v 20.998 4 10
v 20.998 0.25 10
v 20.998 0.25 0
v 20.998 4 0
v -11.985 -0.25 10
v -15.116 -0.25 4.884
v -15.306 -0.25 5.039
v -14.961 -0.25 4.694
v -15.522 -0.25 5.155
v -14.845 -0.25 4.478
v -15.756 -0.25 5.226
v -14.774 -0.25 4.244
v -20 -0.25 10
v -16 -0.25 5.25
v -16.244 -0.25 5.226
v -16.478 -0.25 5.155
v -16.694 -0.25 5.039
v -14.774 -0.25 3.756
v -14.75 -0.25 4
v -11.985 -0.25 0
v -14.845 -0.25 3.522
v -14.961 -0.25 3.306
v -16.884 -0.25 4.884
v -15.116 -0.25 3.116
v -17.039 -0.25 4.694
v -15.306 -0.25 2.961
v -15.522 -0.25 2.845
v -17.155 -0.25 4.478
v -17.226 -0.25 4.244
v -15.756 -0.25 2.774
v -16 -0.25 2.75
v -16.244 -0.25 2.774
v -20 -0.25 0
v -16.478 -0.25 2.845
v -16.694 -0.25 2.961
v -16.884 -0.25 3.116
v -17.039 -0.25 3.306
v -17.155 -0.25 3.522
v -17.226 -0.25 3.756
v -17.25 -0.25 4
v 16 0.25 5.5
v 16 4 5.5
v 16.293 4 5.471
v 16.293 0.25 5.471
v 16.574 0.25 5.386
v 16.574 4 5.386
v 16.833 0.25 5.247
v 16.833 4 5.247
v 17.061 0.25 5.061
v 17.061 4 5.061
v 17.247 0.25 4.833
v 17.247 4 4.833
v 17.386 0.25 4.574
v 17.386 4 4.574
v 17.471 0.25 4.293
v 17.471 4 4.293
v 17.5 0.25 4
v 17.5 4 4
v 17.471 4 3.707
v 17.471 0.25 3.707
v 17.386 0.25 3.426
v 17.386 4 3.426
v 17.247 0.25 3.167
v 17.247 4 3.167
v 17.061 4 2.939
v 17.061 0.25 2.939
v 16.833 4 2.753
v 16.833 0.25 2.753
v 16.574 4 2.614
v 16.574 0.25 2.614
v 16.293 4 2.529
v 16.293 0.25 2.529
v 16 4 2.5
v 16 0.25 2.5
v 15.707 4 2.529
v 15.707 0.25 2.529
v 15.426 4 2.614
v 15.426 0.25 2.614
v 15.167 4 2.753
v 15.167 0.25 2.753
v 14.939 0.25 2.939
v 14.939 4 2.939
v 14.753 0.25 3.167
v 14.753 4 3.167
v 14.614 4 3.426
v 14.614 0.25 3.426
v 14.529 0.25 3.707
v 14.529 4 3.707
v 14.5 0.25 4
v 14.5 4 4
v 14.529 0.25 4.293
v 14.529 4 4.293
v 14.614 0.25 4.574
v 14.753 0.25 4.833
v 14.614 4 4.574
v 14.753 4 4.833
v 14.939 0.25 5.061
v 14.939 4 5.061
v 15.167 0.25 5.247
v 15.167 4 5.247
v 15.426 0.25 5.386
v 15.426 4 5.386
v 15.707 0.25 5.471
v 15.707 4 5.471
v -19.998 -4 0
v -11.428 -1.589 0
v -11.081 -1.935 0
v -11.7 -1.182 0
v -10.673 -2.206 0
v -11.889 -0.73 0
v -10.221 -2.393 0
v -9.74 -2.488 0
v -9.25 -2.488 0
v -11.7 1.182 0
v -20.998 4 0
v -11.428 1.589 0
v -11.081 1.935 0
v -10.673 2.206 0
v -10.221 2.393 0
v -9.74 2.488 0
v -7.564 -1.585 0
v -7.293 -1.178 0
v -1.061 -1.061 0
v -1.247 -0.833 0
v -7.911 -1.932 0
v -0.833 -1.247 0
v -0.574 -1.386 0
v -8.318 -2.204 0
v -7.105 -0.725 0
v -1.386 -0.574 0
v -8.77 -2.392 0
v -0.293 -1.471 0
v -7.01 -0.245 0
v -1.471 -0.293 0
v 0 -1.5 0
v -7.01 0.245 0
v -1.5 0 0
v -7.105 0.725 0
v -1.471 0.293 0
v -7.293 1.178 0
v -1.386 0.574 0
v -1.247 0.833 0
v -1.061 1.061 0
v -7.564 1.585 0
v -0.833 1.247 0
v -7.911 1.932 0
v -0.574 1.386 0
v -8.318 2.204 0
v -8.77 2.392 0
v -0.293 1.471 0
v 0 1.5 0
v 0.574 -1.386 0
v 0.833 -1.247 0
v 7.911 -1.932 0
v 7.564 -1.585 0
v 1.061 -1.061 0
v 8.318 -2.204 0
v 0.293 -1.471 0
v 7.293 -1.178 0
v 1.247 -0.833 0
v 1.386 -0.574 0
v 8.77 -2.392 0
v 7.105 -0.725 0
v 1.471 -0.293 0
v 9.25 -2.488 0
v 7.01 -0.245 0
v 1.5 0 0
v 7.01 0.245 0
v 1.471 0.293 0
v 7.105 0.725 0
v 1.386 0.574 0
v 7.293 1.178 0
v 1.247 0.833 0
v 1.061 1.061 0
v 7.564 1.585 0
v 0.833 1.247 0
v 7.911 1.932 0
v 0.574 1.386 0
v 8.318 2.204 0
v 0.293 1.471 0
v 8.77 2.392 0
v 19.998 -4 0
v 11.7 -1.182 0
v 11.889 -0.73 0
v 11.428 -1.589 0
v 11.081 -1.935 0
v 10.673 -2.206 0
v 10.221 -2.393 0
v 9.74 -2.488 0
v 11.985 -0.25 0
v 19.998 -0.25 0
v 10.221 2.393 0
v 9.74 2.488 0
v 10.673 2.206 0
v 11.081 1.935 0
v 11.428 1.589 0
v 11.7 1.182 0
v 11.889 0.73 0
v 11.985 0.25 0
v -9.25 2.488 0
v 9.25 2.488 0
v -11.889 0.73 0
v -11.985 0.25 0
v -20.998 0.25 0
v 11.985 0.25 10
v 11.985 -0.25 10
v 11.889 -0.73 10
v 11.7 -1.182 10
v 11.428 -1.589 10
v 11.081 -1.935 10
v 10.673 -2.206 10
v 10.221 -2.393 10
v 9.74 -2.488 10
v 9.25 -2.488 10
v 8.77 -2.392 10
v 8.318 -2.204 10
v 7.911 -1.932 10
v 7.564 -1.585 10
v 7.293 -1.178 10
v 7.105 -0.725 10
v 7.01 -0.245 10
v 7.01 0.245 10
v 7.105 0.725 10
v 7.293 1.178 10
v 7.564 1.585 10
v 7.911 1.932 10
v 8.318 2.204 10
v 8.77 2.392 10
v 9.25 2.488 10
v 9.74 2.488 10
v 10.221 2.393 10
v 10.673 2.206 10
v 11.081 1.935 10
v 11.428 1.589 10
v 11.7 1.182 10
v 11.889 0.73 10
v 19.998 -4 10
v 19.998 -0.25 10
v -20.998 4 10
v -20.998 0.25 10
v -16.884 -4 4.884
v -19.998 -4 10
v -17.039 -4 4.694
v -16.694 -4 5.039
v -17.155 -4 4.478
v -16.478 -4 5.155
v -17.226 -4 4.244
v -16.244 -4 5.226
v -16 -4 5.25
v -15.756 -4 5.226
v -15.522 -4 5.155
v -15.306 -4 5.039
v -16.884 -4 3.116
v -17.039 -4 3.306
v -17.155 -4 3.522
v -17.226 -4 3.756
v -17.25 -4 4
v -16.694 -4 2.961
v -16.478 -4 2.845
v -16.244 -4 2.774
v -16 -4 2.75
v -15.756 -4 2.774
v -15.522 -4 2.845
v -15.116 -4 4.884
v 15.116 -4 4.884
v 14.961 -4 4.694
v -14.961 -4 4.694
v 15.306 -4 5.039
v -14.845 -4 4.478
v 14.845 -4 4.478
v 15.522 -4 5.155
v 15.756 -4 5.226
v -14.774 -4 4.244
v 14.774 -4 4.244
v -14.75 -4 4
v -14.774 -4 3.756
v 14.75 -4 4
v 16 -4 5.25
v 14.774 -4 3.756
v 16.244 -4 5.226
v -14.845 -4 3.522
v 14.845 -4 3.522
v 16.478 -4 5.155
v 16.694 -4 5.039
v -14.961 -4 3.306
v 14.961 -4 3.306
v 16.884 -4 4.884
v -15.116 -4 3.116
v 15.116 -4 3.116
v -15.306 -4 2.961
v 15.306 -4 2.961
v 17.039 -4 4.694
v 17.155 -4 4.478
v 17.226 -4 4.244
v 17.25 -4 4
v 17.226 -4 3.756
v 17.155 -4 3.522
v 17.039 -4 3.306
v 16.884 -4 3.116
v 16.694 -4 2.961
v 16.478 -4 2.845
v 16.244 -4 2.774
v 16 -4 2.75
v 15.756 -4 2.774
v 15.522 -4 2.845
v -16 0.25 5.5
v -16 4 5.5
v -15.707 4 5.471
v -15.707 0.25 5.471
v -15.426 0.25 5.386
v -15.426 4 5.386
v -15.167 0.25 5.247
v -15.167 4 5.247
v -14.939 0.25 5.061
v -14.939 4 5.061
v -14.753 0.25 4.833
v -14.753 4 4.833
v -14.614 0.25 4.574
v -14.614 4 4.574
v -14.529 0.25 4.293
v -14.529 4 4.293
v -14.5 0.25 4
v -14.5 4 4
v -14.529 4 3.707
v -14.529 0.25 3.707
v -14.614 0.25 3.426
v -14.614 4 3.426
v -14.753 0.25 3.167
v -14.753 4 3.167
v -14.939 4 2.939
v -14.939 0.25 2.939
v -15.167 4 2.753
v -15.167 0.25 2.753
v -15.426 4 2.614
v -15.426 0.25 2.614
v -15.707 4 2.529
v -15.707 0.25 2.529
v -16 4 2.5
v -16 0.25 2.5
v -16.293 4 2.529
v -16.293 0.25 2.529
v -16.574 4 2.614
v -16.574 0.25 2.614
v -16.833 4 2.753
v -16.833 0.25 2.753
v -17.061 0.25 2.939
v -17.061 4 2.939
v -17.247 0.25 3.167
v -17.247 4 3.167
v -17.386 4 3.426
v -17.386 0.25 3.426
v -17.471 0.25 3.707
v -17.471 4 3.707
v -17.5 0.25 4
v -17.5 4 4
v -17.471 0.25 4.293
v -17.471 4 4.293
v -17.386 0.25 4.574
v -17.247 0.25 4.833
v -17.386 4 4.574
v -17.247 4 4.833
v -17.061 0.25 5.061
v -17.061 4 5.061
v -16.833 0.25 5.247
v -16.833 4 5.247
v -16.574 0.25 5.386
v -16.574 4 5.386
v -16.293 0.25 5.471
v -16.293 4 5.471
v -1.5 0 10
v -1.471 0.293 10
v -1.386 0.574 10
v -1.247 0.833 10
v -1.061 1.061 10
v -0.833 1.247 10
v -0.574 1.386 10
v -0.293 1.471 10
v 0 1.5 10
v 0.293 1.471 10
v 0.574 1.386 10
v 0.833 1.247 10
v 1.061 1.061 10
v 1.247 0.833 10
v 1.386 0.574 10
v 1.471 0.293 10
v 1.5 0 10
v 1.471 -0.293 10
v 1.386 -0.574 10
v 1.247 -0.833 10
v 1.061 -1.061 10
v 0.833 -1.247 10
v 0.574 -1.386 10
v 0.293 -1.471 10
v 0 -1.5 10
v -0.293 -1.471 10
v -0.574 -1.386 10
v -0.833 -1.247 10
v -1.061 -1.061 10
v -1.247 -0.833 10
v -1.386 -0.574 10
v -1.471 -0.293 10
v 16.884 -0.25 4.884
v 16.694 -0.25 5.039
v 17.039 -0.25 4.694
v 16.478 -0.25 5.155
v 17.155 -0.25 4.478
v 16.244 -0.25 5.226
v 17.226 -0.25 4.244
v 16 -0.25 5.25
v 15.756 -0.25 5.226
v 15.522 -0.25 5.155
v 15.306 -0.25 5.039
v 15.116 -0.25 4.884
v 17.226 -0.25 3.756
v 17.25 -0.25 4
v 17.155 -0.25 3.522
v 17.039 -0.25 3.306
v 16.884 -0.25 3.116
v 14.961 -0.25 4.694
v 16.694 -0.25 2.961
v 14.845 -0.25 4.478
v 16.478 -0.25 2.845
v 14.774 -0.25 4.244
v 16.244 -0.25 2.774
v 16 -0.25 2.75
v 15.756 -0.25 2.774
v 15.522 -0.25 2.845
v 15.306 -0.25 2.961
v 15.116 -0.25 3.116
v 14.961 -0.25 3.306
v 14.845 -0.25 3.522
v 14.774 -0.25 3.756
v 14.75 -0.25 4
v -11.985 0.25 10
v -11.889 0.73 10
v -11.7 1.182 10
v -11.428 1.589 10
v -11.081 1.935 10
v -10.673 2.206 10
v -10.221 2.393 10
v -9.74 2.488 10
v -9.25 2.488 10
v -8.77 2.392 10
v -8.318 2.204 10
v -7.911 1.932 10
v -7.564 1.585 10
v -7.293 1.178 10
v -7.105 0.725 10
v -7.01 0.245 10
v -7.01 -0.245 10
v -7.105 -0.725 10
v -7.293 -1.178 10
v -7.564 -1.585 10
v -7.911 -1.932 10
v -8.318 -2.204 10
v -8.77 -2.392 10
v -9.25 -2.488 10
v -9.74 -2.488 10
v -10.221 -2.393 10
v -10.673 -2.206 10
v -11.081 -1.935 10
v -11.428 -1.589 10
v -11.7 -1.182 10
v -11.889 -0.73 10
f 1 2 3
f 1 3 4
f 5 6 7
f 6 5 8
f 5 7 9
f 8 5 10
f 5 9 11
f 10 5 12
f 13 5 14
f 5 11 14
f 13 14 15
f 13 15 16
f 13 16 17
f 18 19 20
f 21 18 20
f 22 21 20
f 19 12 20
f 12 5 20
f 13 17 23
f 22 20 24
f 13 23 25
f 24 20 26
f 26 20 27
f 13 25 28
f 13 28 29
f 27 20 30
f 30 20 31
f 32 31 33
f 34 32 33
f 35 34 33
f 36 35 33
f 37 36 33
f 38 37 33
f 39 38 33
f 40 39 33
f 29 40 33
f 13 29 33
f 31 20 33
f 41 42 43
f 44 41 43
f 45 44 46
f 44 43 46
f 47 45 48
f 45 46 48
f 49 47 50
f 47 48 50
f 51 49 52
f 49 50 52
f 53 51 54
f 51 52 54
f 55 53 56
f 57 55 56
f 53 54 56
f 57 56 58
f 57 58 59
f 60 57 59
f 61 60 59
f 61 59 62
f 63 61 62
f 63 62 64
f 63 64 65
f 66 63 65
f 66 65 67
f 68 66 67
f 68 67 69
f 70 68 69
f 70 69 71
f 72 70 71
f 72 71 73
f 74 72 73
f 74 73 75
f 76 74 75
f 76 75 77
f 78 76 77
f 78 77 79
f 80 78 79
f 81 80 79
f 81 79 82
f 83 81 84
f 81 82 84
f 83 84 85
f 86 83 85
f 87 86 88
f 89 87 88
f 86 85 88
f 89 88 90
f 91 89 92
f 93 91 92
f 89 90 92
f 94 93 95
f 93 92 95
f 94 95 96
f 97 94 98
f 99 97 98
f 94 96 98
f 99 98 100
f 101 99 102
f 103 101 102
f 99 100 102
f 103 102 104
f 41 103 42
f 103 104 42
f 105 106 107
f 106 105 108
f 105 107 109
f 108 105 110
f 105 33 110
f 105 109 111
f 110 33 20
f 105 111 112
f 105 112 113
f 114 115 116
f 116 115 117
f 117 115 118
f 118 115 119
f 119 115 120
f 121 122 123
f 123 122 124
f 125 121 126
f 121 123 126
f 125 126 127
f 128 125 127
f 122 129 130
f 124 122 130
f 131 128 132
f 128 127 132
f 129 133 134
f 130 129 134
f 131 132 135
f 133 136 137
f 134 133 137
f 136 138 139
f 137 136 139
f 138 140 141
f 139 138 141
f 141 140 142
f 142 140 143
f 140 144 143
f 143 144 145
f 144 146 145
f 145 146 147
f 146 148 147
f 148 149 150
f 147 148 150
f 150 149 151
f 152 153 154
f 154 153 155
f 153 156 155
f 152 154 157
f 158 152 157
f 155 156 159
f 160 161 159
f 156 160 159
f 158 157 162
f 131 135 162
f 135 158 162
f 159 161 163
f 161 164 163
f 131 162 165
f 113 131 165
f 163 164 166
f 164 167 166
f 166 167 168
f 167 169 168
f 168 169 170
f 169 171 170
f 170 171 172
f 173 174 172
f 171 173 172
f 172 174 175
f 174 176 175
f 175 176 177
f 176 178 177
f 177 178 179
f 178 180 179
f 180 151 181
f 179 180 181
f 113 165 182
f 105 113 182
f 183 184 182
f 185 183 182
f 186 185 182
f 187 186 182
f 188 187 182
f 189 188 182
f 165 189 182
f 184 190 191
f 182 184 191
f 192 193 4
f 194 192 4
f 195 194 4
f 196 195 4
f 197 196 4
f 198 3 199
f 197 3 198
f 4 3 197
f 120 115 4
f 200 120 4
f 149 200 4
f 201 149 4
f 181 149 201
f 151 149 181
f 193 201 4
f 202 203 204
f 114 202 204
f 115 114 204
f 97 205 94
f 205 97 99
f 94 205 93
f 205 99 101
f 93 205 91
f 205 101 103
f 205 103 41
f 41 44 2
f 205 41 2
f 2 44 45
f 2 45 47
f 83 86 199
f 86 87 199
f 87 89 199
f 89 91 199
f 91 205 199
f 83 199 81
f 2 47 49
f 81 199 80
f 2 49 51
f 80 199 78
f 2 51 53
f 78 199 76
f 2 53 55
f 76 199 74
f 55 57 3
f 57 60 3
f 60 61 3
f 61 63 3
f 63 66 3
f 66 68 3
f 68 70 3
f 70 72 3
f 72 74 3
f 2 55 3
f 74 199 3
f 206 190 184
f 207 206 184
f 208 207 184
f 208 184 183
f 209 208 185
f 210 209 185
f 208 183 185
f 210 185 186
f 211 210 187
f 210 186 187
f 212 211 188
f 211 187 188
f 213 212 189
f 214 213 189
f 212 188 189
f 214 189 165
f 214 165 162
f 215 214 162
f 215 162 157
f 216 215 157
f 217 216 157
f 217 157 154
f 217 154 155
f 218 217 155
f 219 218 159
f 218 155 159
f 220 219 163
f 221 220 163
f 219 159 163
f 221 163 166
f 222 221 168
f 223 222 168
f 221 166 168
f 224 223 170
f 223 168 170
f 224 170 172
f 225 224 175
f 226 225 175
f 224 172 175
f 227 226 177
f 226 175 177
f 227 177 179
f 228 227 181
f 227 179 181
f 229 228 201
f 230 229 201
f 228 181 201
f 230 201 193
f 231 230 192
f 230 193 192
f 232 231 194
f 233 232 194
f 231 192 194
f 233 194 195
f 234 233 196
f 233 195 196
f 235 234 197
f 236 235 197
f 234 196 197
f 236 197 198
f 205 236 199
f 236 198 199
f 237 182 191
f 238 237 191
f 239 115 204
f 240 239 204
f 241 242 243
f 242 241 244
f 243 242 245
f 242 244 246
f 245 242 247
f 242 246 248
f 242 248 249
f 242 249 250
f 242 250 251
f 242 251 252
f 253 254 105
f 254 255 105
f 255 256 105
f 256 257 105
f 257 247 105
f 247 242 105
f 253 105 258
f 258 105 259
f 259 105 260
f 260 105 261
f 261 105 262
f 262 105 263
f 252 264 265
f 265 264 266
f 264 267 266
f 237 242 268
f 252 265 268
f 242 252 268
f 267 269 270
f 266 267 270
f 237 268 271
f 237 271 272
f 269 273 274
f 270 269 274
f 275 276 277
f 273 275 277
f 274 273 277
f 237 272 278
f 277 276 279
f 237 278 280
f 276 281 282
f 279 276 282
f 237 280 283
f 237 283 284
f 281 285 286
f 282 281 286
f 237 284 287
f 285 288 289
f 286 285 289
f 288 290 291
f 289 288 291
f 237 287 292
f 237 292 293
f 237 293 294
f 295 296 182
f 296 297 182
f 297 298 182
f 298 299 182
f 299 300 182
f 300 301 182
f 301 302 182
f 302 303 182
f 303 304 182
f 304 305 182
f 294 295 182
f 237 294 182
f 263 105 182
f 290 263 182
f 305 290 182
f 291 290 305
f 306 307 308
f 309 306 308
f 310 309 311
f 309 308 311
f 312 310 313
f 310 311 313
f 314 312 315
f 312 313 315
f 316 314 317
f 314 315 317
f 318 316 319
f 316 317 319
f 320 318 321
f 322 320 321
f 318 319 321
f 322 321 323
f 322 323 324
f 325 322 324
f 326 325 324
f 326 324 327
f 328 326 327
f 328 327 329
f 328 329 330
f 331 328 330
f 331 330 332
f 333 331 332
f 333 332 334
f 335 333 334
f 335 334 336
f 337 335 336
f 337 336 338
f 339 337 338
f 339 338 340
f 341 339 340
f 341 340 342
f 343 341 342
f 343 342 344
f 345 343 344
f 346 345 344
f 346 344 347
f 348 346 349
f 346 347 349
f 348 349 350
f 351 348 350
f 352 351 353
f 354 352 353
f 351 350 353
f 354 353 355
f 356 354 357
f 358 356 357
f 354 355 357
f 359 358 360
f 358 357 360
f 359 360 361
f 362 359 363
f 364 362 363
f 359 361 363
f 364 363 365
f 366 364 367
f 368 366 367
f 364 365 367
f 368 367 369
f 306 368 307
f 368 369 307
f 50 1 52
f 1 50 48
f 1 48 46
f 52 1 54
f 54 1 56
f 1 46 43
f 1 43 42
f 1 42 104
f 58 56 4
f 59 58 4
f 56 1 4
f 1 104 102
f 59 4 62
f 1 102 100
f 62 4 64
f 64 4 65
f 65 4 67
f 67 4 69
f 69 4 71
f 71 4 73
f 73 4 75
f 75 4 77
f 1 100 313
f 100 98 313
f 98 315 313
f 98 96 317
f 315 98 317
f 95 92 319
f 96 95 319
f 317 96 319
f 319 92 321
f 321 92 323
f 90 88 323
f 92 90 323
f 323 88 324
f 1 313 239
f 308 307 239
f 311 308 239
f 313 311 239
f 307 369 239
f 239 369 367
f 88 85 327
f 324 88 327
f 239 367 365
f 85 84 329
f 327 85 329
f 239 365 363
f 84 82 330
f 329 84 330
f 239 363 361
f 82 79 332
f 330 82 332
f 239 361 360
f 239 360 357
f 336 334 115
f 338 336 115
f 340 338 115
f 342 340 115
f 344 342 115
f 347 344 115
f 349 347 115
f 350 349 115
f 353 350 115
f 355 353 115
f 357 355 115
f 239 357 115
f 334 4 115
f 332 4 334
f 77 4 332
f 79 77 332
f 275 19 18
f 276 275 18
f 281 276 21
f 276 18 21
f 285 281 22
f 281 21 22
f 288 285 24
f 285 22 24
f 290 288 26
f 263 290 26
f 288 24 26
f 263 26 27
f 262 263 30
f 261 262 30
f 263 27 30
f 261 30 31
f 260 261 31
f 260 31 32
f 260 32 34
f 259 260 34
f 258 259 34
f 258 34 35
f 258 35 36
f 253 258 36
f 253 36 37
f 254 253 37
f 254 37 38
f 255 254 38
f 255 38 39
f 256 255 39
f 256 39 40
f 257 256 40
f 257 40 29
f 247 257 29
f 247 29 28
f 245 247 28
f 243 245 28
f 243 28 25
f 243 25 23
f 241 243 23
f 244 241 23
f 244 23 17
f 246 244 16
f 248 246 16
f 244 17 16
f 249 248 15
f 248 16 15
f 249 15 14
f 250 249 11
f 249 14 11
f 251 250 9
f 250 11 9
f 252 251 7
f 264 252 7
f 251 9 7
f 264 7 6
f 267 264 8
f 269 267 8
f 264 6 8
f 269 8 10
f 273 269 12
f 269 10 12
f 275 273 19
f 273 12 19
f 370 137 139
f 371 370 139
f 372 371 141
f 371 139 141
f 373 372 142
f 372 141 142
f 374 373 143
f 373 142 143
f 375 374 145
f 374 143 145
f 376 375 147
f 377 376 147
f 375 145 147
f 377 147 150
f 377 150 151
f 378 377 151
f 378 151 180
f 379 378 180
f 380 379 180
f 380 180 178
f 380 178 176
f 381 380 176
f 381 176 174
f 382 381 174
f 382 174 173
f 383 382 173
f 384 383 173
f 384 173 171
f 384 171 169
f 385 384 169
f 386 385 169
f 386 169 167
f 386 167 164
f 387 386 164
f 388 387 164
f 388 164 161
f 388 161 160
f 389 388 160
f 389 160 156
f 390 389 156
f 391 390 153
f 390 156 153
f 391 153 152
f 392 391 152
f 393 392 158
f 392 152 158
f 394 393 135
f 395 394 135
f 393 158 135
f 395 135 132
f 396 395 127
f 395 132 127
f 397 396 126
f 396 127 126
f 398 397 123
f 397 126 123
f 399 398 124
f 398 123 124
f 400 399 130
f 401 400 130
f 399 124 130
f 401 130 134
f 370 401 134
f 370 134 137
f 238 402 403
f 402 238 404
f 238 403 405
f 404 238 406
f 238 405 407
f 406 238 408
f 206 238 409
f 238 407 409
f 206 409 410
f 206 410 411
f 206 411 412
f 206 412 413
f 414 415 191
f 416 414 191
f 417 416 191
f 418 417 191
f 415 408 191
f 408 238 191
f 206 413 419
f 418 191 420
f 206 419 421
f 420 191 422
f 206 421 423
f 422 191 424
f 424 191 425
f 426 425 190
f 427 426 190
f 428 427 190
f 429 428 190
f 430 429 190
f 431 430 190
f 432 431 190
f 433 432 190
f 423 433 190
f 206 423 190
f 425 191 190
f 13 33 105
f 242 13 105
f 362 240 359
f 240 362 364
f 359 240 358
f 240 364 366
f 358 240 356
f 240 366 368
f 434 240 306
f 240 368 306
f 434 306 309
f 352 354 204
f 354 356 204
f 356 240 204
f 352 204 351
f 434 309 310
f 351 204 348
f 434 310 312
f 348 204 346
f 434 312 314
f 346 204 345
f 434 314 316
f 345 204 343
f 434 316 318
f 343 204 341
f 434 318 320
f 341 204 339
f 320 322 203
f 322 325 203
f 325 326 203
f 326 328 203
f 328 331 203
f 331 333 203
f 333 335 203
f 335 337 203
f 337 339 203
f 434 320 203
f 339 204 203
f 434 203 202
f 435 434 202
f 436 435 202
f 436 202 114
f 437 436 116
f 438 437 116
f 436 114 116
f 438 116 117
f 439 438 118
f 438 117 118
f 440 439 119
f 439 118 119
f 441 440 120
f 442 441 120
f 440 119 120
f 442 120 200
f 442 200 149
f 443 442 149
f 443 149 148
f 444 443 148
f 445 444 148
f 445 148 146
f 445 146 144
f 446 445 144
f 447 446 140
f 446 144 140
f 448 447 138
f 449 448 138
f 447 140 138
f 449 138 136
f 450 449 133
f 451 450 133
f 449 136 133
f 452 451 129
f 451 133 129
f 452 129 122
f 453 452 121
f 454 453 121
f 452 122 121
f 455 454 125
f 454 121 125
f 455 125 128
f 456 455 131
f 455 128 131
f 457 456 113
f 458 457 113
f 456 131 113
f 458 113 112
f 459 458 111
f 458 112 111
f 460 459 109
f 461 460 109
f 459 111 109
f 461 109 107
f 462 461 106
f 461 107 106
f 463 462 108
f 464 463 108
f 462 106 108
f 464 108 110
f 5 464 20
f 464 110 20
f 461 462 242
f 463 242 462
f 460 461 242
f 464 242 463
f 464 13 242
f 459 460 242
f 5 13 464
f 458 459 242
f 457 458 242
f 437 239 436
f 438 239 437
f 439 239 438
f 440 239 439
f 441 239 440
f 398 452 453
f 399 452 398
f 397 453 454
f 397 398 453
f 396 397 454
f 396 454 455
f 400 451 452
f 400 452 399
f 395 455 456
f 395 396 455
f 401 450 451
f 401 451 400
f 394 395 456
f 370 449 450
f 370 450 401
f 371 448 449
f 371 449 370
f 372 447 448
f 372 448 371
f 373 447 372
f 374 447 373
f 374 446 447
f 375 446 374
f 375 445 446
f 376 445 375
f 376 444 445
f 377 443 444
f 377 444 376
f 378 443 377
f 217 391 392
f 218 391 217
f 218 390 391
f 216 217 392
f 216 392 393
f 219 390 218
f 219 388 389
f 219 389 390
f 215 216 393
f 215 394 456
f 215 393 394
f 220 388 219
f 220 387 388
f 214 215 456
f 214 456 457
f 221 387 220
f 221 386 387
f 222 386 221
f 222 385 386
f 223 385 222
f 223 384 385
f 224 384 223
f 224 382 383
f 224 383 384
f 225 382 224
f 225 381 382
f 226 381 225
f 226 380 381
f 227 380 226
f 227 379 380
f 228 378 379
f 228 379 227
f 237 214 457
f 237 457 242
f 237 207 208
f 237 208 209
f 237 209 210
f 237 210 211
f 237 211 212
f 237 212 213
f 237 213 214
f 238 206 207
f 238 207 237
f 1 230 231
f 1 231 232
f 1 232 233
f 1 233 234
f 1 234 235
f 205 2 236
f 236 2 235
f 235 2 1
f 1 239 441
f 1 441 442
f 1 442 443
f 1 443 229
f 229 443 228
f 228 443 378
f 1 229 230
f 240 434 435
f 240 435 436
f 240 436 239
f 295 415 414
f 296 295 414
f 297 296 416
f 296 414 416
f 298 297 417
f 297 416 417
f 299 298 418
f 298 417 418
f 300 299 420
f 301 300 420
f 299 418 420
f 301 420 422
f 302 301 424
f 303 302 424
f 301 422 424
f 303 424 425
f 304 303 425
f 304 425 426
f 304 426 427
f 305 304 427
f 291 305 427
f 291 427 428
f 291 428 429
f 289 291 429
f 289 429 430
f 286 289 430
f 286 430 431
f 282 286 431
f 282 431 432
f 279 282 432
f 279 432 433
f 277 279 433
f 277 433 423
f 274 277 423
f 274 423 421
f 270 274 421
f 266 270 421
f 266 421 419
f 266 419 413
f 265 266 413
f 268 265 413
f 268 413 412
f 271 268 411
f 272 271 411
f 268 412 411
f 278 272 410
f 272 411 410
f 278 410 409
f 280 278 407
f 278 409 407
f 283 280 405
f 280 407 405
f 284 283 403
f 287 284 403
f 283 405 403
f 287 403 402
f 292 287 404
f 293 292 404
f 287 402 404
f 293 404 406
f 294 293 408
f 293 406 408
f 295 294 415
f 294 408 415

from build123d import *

# Parameters (mm, degrees)
BOSS_EXTRUDE1_DEPTH        = 10
M3X0_5_TAPPED_HOLE1_D      = 2.5
M3X0_5_TAPPED_HOLE1_DEPTH  = 3.74999984
M3X0_5_TAPPED_HOLE2_D      = 3
F_3_0MM_DOWEL_HOLE1_REACH  = 40.325
F_3_0MM_DOWEL_HOLE1_BORE_R = 1.5


with BuildPart() as part:
    # Sketch1 → Boss-Extrude1 (new body)
    with BuildSketch(Plane.XY):
        with BuildLine():
            Line((-19.997736867, 0.25), (-11.98520546, 0.25))
            ThreePointArc((-11.98520546, 0.25), (-6.997736867, 0), (-11.98520546, -0.25))
            Line((-11.98520546, -0.25), (-20, -0.25))
            Line((-20, -0.25), (-19.997736867, -3.99999984))
            Line((-19.997736867, -3.99999984), (19.997736867, -3.99999984))
            Line((19.997736867, -3.99999984), (19.997736867, -0.25))
            Line((19.997736867, -0.25), (11.98520546, -0.25))
            ThreePointArc((11.98520546, -0.25), (6.997736867, 0), (11.98520546, 0.25))
            Line((11.98520546, 0.25), (19.997736867, 0.25))
            Line((19.997736867, 0.25), (20.997736867, 0.25))
            Line((20.997736867, 0.25), (20.997736867, 3.99999984))
            Line((20.997736867, 3.99999984), (20.002263133, 3.99999984))
            Line((20.002263133, 3.99999984), (-19.997736867, 3.99999984))
            Line((-19.997736867, 3.99999984), (-20.997736867, 3.99999984))
            Line((-20.997736867, 3.99999984), (-20.997736867, 0.25))
            Line((-20.997736867, 0.25), (-19.997736867, 0.25))
        make_face()
    extrude(amount=BOSS_EXTRUDE1_DEPTH)

    # M3x0.5 Tapped Hole1
    with Locations(Plane(origin=(-16, -3.99999984, 4), x_dir=(-1, 0, 0), z_dir=(0, -1, 0))):
        with Locations((0, 0), (-32, 0)):
            Hole(M3X0_5_TAPPED_HOLE1_D / 2, depth=M3X0_5_TAPPED_HOLE1_DEPTH)

    # M3x0.5 Tapped Hole2 (through all)
    with Locations(Plane.XY.offset(10)):
        with Locations((0, 0)):
            Hole(M3X0_5_TAPPED_HOLE2_D / 2)

    # Ø3.0mm Dowel Hole1 bore (on position points) → Ø3.0mm Dowel Hole1 (cut, up to next)
    with BuildSketch(Plane(origin=(16, 3.99999984, 4), x_dir=(0, 0, 1), z_dir=(0, 1, 0)), mode=Mode.PRIVATE) as f_3_0mm_dowel_hole1_sk1:
        Circle(F_3_0MM_DOWEL_HOLE1_BORE_R)
    f_3_0mm_dowel_hole1_tool1 = extrude(f_3_0mm_dowel_hole1_sk1.sketch, amount=-F_3_0MM_DOWEL_HOLE1_REACH, mode=Mode.PRIVATE) & part.part
    # Ø3.0mm Dowel Hole1 bore (on position points) → Ø3.0mm Dowel Hole1 (cut, up to next)
    with BuildSketch(Plane(origin=(16, 3.99999984, 4), x_dir=(0, 0, 1), z_dir=(0, 1, 0)), mode=Mode.PRIVATE) as f_3_0mm_dowel_hole1_sk2:
        with Locations((0, -32)):
            Circle(F_3_0MM_DOWEL_HOLE1_BORE_R)
    f_3_0mm_dowel_hole1_tool2 = extrude(f_3_0mm_dowel_hole1_sk2.sketch, amount=-F_3_0MM_DOWEL_HOLE1_REACH, mode=Mode.PRIVATE) & part.part
    add(f_3_0mm_dowel_hole1_tool1.solids().sort_by_distance((16, 4, 4))[0], mode=Mode.SUBTRACT)
    add(f_3_0mm_dowel_hole1_tool2.solids().sort_by_distance((-16, 4, 4))[0], mode=Mode.SUBTRACT)


solid = part.part
